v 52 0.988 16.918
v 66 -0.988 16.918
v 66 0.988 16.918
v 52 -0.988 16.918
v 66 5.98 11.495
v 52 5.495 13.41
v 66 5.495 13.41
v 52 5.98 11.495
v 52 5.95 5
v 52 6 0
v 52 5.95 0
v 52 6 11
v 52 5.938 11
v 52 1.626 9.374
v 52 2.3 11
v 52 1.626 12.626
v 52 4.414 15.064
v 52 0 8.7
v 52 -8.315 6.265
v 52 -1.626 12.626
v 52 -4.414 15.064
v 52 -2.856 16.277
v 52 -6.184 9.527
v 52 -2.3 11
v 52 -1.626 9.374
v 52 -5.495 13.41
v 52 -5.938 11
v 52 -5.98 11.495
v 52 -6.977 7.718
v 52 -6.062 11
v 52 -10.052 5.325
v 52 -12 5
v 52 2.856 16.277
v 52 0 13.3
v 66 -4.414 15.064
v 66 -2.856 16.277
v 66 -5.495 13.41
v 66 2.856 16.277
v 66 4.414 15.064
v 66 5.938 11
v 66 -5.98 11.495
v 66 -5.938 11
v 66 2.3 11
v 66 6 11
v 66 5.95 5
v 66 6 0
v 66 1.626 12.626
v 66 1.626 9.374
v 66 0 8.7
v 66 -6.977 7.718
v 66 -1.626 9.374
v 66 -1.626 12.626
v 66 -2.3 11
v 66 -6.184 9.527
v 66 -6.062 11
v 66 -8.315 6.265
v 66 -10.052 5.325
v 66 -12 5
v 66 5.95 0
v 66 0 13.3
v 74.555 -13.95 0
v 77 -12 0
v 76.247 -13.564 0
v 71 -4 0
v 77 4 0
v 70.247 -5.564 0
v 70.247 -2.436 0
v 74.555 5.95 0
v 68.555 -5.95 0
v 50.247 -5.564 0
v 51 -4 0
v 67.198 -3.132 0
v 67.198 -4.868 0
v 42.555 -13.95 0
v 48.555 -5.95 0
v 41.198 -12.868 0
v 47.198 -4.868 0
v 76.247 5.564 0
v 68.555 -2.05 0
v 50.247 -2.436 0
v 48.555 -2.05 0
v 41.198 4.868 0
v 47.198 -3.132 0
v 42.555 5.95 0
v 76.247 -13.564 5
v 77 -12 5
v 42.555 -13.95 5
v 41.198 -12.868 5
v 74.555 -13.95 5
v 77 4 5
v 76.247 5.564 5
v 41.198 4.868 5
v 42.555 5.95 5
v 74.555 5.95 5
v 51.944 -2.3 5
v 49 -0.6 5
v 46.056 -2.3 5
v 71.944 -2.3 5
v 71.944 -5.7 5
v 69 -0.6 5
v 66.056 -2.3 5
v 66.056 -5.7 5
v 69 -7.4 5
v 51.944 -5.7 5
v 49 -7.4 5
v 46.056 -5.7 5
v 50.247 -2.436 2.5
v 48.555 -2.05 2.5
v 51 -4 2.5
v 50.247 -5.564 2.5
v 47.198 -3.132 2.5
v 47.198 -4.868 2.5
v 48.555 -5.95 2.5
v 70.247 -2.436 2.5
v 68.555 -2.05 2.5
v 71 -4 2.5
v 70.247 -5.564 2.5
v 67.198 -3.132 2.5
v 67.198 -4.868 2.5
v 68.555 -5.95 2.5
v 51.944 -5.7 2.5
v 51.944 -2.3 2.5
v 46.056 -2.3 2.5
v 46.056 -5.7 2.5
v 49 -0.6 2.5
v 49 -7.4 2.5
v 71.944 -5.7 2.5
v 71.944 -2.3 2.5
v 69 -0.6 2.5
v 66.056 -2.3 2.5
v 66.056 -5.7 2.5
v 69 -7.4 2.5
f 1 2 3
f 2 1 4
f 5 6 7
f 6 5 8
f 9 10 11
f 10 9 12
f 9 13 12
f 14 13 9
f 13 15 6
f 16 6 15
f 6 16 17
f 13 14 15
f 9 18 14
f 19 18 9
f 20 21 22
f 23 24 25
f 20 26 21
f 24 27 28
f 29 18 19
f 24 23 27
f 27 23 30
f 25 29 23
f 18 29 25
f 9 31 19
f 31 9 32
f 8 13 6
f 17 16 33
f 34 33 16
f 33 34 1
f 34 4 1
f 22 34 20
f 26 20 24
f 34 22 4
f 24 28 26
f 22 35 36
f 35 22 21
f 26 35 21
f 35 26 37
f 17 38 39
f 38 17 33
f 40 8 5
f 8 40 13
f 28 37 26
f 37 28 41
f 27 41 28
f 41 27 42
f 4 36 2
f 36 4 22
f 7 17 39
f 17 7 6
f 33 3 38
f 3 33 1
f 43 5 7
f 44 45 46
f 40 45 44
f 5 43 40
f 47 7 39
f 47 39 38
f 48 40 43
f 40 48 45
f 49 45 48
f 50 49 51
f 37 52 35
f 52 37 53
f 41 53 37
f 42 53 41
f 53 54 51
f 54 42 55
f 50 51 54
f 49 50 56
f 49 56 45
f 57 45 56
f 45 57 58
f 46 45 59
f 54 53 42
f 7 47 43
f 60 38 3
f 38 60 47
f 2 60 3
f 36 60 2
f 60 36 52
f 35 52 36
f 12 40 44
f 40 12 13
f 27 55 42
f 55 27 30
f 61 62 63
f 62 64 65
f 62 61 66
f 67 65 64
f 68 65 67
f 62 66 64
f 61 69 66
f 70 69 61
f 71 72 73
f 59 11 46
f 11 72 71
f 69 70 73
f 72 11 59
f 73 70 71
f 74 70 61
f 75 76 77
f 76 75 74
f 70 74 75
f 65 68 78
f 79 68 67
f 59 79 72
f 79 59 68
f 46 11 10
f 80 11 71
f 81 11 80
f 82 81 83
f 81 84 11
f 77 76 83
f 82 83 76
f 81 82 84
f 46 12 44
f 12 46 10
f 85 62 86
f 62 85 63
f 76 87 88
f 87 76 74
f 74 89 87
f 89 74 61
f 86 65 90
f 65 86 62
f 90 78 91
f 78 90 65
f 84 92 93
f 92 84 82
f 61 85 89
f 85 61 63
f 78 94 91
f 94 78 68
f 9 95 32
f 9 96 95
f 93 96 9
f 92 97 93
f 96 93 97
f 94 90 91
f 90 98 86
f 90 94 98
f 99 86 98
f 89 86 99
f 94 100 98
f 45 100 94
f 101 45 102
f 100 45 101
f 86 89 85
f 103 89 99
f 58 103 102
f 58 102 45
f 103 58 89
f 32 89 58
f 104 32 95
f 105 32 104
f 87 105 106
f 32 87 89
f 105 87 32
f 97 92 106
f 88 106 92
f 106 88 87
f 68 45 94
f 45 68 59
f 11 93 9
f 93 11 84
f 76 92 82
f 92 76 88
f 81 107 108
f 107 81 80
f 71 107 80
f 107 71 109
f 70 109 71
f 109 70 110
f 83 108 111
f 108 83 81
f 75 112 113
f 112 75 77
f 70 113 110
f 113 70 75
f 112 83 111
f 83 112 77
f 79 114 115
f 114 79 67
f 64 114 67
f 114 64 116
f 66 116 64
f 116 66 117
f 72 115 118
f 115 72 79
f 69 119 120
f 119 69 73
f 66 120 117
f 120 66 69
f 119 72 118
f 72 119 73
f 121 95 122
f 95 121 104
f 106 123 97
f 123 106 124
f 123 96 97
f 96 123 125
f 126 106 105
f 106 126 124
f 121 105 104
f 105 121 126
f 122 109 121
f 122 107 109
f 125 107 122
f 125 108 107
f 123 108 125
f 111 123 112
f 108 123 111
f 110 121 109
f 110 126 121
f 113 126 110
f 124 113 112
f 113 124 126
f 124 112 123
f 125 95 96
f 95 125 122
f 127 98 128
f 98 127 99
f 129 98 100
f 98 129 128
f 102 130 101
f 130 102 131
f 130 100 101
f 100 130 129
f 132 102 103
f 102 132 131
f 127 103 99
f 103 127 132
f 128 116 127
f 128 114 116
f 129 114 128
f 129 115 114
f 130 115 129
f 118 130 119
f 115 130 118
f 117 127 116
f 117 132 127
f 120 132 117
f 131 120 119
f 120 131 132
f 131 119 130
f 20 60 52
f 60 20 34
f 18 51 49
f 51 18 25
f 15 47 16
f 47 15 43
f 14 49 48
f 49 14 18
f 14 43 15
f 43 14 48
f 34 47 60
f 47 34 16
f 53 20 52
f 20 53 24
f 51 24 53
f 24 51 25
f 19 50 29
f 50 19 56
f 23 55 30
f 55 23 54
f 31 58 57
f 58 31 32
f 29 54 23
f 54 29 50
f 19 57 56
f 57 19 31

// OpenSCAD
// ..............................
// Prusa i3 Things
// LCD Box_hinge
// Oktay Gülmez
// 02/07/2014
// GNU GPL v3
// ..............................

difference(){
  union(){
    

    
         translate([52,0,11]) rotate([0,90,0]) cylinder(h=14, r=6);
    translate([52,-12,0]) cube([14,18,11]);

   //translate([41,-12,0]) cube([36,12,6]); 
  minkowski(){ 
   translate([43,-12,0]) cube([32,16,4]);  
    cylinder(r=2);
  } 
     
  }
 
  
  translate([49,-4,0]) cylinder(h=6.5, r=2);
  translate([69,-4,0]) cylinder(h=6.5, r=2);
   translate([49,-4,2.5]) rotate([0,0,90]) cylinder(h=6.5, r=3.4, $fn=6);
  translate([69,-4,2.5]) rotate([0,0,90]) cylinder(h=6.5, r=3.4, $fn=6);
   

  translate([40,0,11]) rotate([0,90,0]) cylinder(h=38, r=2.3);
  
  translate([51,-12,11]) rotate([0,90,0]) cylinder(h=16, r=6);

   
}
